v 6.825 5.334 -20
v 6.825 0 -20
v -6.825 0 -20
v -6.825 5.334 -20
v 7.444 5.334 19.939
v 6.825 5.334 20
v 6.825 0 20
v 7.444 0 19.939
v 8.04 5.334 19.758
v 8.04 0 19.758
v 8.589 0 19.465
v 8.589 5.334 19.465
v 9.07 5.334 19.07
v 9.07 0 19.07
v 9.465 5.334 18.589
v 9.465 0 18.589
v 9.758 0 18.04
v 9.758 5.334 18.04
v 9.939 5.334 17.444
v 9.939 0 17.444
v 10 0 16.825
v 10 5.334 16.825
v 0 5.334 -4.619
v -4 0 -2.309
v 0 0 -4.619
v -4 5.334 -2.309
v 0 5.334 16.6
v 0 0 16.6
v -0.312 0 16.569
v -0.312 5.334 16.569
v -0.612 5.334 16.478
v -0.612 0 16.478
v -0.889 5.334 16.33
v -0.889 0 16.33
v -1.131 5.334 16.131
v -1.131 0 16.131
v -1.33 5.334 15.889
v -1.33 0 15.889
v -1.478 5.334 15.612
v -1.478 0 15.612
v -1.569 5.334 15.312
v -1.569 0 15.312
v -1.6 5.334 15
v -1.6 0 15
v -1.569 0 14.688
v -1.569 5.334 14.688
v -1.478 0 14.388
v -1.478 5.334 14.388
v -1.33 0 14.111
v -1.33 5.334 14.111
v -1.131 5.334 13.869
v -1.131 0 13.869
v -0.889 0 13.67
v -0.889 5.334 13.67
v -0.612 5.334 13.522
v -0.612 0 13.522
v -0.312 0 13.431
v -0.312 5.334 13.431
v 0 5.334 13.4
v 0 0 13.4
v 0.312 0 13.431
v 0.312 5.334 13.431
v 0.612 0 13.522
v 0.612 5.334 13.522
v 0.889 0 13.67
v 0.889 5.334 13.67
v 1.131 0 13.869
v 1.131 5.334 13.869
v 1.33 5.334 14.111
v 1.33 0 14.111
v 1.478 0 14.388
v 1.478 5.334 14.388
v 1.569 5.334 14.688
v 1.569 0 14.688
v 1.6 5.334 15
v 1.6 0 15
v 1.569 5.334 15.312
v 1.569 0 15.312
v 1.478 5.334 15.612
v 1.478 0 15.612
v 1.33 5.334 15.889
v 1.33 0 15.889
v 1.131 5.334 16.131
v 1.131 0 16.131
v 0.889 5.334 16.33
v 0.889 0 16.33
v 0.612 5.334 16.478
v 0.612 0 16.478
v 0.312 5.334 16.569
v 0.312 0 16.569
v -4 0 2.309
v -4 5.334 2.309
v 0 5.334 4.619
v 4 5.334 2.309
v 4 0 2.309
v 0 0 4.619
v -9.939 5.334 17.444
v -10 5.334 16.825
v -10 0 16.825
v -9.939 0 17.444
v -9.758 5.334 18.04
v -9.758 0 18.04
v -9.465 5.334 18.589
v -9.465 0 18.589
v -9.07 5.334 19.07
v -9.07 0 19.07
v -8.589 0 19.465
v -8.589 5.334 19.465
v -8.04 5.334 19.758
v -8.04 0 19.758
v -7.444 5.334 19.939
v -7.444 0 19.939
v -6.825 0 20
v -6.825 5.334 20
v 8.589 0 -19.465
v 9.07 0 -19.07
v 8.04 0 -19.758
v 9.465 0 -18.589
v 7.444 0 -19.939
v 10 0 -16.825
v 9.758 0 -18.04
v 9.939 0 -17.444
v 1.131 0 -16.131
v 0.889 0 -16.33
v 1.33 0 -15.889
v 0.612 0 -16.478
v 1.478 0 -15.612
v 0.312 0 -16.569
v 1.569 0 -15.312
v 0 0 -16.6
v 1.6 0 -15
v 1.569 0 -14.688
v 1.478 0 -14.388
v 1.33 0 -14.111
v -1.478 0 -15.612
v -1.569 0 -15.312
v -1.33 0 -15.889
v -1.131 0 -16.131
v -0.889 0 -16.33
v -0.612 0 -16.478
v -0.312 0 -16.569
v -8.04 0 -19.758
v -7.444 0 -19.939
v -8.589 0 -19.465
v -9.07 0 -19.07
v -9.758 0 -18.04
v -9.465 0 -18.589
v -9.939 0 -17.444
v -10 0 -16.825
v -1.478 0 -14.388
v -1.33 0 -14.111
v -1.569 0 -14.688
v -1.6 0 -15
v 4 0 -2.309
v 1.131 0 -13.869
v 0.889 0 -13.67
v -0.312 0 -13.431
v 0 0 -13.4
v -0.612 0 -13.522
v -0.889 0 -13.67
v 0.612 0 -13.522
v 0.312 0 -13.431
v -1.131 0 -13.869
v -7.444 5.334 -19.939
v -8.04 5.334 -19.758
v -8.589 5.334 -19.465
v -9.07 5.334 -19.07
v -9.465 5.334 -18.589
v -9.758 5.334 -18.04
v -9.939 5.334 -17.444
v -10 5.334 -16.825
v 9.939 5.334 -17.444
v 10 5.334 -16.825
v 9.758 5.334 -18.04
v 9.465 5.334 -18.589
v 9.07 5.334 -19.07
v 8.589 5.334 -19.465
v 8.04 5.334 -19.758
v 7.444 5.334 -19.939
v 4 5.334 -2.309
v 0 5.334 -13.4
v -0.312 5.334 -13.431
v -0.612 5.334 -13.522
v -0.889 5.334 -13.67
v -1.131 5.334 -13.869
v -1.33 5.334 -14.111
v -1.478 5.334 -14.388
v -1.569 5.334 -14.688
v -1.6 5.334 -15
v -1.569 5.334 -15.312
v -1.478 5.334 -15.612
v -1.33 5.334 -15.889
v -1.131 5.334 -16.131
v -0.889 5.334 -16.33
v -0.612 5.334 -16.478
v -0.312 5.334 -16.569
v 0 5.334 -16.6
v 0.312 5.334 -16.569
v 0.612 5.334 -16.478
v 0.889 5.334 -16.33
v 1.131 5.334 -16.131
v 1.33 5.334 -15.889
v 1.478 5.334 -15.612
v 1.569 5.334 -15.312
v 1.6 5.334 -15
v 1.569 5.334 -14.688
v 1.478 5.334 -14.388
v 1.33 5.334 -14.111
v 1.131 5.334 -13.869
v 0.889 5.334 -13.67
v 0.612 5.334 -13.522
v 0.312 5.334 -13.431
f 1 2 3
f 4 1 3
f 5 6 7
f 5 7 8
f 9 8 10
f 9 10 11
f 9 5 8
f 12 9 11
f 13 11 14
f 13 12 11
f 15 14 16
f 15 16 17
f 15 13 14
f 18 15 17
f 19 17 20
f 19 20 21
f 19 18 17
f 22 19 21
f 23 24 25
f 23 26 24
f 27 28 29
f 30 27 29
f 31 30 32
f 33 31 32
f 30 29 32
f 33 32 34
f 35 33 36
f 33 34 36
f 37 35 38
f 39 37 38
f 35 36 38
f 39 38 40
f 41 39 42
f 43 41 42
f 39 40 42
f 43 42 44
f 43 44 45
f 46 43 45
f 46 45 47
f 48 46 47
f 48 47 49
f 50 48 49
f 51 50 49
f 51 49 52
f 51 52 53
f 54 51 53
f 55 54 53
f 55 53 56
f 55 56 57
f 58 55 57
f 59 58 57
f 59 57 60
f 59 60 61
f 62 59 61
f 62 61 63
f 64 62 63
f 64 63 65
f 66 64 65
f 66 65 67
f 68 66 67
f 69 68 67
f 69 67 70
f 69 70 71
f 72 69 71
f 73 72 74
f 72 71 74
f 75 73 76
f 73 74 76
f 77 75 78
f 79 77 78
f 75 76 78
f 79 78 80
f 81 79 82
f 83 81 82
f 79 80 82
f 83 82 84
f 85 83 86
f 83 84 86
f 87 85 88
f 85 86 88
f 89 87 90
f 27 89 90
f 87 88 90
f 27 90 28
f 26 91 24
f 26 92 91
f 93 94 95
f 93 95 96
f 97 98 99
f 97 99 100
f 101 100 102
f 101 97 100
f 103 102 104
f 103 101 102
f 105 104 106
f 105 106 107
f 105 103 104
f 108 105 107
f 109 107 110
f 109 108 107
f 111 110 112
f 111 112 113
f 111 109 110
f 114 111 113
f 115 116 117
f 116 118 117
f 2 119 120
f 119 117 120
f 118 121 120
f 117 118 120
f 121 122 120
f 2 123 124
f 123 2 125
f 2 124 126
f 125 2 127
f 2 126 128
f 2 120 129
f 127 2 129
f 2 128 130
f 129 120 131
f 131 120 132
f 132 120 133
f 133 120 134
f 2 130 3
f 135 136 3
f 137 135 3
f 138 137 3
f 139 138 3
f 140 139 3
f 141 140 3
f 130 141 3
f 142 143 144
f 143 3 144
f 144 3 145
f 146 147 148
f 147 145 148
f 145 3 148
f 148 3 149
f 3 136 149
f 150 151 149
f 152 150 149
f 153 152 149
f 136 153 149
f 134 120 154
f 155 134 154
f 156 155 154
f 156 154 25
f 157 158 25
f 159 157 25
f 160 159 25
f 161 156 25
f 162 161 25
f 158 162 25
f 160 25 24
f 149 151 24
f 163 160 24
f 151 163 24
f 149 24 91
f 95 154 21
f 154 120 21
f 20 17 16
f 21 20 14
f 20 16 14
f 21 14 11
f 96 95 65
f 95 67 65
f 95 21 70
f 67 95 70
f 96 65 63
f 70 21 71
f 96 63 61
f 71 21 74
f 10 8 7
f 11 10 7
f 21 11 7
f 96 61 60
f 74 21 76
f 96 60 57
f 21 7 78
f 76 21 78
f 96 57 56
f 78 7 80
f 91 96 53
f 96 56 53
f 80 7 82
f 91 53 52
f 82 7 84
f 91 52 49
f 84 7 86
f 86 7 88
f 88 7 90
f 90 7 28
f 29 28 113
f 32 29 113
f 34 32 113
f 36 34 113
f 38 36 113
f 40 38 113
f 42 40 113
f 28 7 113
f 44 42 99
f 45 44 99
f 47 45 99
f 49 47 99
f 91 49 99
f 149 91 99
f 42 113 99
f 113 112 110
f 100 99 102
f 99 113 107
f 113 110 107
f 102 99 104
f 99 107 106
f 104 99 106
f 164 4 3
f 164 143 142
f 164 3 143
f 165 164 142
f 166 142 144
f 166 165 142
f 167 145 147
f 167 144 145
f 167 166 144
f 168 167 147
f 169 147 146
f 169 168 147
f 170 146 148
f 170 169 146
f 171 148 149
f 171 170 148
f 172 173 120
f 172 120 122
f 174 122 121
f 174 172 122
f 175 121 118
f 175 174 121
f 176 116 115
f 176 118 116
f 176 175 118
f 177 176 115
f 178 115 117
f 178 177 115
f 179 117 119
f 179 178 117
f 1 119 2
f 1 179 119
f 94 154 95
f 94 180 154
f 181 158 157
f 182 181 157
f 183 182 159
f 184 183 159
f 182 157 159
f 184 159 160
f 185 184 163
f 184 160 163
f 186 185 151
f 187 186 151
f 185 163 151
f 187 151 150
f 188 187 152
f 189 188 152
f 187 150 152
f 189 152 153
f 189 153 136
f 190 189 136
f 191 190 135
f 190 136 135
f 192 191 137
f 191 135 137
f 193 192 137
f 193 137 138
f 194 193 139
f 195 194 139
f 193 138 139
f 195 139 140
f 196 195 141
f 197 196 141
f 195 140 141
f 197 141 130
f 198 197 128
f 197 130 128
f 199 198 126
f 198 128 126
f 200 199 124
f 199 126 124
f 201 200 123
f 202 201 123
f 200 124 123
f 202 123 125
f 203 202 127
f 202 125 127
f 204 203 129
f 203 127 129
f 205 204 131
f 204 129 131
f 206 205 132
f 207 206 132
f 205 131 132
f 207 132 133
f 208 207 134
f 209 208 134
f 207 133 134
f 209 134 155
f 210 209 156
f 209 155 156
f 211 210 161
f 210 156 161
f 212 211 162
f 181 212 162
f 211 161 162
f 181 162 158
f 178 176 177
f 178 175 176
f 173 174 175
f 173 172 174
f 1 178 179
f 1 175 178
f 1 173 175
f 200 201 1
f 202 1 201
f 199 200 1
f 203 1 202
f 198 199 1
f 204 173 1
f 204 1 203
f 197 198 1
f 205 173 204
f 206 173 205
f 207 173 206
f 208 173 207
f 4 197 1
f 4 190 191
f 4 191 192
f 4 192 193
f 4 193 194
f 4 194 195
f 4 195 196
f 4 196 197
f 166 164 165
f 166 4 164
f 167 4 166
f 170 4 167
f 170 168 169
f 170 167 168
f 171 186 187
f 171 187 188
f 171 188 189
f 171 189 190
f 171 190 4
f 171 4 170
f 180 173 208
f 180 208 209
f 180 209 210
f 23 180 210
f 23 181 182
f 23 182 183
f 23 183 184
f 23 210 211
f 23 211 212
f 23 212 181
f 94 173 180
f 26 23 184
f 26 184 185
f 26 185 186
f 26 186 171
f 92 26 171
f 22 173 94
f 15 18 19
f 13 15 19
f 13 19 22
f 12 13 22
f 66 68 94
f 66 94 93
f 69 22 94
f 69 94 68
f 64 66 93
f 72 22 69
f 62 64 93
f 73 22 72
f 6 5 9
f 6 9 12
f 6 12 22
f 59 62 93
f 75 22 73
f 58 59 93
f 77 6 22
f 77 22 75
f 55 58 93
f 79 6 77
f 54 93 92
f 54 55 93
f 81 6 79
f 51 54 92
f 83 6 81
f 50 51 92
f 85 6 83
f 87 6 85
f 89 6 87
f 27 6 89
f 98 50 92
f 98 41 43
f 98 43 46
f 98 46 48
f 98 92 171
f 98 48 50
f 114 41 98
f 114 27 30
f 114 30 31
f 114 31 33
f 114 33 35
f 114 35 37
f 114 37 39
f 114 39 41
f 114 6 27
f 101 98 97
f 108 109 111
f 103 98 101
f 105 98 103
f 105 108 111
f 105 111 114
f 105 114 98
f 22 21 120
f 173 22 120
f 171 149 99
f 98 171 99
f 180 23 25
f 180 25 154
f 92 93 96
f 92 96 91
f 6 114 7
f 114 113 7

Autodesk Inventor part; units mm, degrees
ref_plane "YZ Plane" through (0, 0, 0) normal (1, 0, 0) x (0, 1, 0)
ref_plane "XZ Plane" through (0, 0, 0) normal (0, 1, 0) x (-1, 0, 0)
ref_plane "XY Plane" through (0, 0, 0) normal (0, 0, 1) x (1, 0, 0)
sketch "Sketch1" plane through (0, 0, 0) normal (0, 1, 0) x (-1, 0, 0)
  line L0 (10, 20) -> (-10, 20)
  line L1 (-10, 20) -> (-10, -20)
  line L2 (-10, -20) -> (10, -20)
  line L3 (10, -20) -> (10, 20)
  point P0 (0, 0)
  point P1 (10, 0)
  point P2 (0, 20)
  dimension "d0" = 20
  dimension "d1" = 40
extrude "Extrusion1" add sketch "Sketch1" along normal blind 5.334
sketch "Sketch2" plane through (0, 5.334, 0) normal (0, 1, 0) x (1, 0, 0)
  line L0 (0, 4.6188) -> (4, 2.3094)
  line L1 (4, 2.3094) -> (4, -2.3094)
  line L2 (4, -2.3094) -> (0, -4.6188)
  line L3 (0, -4.6188) -> (-4, -2.3094)
  line L4 (-4, -2.3094) -> (-4, 2.3094)
  line L5 (-4, 2.3094) -> (0, 4.6188)
  point P0 (0, 0)
  point P1 (0, 0)
  dimension "d4" = 8
extrude "Extrusion2" cut sketch "Sketch2" against normal through all
sketch "Sketch3" plane through (0, 5.334, 0) normal (0, 1, 0) x (1, 0, 0)
  point P0 (0, 0)
  point P1 (0, -15)
  point P2 (0, 15)
  dimension "d7" = 30
  dimension "d8" = 15
hole "Hole1" at (0, 5.334, 15) at (0, 5.334, -15) direction (0, -1, 0) diameter 3.2 end through all
fillet "Fillet1" radius 3.175 4 edges at (-10, 2.667, 20) (10, 2.667, 20) (10, 2.667, -20) (-10, 2.667, -20)
equation "\"d8\" = 0.5 * d7"
properties part number "hex_plate"
